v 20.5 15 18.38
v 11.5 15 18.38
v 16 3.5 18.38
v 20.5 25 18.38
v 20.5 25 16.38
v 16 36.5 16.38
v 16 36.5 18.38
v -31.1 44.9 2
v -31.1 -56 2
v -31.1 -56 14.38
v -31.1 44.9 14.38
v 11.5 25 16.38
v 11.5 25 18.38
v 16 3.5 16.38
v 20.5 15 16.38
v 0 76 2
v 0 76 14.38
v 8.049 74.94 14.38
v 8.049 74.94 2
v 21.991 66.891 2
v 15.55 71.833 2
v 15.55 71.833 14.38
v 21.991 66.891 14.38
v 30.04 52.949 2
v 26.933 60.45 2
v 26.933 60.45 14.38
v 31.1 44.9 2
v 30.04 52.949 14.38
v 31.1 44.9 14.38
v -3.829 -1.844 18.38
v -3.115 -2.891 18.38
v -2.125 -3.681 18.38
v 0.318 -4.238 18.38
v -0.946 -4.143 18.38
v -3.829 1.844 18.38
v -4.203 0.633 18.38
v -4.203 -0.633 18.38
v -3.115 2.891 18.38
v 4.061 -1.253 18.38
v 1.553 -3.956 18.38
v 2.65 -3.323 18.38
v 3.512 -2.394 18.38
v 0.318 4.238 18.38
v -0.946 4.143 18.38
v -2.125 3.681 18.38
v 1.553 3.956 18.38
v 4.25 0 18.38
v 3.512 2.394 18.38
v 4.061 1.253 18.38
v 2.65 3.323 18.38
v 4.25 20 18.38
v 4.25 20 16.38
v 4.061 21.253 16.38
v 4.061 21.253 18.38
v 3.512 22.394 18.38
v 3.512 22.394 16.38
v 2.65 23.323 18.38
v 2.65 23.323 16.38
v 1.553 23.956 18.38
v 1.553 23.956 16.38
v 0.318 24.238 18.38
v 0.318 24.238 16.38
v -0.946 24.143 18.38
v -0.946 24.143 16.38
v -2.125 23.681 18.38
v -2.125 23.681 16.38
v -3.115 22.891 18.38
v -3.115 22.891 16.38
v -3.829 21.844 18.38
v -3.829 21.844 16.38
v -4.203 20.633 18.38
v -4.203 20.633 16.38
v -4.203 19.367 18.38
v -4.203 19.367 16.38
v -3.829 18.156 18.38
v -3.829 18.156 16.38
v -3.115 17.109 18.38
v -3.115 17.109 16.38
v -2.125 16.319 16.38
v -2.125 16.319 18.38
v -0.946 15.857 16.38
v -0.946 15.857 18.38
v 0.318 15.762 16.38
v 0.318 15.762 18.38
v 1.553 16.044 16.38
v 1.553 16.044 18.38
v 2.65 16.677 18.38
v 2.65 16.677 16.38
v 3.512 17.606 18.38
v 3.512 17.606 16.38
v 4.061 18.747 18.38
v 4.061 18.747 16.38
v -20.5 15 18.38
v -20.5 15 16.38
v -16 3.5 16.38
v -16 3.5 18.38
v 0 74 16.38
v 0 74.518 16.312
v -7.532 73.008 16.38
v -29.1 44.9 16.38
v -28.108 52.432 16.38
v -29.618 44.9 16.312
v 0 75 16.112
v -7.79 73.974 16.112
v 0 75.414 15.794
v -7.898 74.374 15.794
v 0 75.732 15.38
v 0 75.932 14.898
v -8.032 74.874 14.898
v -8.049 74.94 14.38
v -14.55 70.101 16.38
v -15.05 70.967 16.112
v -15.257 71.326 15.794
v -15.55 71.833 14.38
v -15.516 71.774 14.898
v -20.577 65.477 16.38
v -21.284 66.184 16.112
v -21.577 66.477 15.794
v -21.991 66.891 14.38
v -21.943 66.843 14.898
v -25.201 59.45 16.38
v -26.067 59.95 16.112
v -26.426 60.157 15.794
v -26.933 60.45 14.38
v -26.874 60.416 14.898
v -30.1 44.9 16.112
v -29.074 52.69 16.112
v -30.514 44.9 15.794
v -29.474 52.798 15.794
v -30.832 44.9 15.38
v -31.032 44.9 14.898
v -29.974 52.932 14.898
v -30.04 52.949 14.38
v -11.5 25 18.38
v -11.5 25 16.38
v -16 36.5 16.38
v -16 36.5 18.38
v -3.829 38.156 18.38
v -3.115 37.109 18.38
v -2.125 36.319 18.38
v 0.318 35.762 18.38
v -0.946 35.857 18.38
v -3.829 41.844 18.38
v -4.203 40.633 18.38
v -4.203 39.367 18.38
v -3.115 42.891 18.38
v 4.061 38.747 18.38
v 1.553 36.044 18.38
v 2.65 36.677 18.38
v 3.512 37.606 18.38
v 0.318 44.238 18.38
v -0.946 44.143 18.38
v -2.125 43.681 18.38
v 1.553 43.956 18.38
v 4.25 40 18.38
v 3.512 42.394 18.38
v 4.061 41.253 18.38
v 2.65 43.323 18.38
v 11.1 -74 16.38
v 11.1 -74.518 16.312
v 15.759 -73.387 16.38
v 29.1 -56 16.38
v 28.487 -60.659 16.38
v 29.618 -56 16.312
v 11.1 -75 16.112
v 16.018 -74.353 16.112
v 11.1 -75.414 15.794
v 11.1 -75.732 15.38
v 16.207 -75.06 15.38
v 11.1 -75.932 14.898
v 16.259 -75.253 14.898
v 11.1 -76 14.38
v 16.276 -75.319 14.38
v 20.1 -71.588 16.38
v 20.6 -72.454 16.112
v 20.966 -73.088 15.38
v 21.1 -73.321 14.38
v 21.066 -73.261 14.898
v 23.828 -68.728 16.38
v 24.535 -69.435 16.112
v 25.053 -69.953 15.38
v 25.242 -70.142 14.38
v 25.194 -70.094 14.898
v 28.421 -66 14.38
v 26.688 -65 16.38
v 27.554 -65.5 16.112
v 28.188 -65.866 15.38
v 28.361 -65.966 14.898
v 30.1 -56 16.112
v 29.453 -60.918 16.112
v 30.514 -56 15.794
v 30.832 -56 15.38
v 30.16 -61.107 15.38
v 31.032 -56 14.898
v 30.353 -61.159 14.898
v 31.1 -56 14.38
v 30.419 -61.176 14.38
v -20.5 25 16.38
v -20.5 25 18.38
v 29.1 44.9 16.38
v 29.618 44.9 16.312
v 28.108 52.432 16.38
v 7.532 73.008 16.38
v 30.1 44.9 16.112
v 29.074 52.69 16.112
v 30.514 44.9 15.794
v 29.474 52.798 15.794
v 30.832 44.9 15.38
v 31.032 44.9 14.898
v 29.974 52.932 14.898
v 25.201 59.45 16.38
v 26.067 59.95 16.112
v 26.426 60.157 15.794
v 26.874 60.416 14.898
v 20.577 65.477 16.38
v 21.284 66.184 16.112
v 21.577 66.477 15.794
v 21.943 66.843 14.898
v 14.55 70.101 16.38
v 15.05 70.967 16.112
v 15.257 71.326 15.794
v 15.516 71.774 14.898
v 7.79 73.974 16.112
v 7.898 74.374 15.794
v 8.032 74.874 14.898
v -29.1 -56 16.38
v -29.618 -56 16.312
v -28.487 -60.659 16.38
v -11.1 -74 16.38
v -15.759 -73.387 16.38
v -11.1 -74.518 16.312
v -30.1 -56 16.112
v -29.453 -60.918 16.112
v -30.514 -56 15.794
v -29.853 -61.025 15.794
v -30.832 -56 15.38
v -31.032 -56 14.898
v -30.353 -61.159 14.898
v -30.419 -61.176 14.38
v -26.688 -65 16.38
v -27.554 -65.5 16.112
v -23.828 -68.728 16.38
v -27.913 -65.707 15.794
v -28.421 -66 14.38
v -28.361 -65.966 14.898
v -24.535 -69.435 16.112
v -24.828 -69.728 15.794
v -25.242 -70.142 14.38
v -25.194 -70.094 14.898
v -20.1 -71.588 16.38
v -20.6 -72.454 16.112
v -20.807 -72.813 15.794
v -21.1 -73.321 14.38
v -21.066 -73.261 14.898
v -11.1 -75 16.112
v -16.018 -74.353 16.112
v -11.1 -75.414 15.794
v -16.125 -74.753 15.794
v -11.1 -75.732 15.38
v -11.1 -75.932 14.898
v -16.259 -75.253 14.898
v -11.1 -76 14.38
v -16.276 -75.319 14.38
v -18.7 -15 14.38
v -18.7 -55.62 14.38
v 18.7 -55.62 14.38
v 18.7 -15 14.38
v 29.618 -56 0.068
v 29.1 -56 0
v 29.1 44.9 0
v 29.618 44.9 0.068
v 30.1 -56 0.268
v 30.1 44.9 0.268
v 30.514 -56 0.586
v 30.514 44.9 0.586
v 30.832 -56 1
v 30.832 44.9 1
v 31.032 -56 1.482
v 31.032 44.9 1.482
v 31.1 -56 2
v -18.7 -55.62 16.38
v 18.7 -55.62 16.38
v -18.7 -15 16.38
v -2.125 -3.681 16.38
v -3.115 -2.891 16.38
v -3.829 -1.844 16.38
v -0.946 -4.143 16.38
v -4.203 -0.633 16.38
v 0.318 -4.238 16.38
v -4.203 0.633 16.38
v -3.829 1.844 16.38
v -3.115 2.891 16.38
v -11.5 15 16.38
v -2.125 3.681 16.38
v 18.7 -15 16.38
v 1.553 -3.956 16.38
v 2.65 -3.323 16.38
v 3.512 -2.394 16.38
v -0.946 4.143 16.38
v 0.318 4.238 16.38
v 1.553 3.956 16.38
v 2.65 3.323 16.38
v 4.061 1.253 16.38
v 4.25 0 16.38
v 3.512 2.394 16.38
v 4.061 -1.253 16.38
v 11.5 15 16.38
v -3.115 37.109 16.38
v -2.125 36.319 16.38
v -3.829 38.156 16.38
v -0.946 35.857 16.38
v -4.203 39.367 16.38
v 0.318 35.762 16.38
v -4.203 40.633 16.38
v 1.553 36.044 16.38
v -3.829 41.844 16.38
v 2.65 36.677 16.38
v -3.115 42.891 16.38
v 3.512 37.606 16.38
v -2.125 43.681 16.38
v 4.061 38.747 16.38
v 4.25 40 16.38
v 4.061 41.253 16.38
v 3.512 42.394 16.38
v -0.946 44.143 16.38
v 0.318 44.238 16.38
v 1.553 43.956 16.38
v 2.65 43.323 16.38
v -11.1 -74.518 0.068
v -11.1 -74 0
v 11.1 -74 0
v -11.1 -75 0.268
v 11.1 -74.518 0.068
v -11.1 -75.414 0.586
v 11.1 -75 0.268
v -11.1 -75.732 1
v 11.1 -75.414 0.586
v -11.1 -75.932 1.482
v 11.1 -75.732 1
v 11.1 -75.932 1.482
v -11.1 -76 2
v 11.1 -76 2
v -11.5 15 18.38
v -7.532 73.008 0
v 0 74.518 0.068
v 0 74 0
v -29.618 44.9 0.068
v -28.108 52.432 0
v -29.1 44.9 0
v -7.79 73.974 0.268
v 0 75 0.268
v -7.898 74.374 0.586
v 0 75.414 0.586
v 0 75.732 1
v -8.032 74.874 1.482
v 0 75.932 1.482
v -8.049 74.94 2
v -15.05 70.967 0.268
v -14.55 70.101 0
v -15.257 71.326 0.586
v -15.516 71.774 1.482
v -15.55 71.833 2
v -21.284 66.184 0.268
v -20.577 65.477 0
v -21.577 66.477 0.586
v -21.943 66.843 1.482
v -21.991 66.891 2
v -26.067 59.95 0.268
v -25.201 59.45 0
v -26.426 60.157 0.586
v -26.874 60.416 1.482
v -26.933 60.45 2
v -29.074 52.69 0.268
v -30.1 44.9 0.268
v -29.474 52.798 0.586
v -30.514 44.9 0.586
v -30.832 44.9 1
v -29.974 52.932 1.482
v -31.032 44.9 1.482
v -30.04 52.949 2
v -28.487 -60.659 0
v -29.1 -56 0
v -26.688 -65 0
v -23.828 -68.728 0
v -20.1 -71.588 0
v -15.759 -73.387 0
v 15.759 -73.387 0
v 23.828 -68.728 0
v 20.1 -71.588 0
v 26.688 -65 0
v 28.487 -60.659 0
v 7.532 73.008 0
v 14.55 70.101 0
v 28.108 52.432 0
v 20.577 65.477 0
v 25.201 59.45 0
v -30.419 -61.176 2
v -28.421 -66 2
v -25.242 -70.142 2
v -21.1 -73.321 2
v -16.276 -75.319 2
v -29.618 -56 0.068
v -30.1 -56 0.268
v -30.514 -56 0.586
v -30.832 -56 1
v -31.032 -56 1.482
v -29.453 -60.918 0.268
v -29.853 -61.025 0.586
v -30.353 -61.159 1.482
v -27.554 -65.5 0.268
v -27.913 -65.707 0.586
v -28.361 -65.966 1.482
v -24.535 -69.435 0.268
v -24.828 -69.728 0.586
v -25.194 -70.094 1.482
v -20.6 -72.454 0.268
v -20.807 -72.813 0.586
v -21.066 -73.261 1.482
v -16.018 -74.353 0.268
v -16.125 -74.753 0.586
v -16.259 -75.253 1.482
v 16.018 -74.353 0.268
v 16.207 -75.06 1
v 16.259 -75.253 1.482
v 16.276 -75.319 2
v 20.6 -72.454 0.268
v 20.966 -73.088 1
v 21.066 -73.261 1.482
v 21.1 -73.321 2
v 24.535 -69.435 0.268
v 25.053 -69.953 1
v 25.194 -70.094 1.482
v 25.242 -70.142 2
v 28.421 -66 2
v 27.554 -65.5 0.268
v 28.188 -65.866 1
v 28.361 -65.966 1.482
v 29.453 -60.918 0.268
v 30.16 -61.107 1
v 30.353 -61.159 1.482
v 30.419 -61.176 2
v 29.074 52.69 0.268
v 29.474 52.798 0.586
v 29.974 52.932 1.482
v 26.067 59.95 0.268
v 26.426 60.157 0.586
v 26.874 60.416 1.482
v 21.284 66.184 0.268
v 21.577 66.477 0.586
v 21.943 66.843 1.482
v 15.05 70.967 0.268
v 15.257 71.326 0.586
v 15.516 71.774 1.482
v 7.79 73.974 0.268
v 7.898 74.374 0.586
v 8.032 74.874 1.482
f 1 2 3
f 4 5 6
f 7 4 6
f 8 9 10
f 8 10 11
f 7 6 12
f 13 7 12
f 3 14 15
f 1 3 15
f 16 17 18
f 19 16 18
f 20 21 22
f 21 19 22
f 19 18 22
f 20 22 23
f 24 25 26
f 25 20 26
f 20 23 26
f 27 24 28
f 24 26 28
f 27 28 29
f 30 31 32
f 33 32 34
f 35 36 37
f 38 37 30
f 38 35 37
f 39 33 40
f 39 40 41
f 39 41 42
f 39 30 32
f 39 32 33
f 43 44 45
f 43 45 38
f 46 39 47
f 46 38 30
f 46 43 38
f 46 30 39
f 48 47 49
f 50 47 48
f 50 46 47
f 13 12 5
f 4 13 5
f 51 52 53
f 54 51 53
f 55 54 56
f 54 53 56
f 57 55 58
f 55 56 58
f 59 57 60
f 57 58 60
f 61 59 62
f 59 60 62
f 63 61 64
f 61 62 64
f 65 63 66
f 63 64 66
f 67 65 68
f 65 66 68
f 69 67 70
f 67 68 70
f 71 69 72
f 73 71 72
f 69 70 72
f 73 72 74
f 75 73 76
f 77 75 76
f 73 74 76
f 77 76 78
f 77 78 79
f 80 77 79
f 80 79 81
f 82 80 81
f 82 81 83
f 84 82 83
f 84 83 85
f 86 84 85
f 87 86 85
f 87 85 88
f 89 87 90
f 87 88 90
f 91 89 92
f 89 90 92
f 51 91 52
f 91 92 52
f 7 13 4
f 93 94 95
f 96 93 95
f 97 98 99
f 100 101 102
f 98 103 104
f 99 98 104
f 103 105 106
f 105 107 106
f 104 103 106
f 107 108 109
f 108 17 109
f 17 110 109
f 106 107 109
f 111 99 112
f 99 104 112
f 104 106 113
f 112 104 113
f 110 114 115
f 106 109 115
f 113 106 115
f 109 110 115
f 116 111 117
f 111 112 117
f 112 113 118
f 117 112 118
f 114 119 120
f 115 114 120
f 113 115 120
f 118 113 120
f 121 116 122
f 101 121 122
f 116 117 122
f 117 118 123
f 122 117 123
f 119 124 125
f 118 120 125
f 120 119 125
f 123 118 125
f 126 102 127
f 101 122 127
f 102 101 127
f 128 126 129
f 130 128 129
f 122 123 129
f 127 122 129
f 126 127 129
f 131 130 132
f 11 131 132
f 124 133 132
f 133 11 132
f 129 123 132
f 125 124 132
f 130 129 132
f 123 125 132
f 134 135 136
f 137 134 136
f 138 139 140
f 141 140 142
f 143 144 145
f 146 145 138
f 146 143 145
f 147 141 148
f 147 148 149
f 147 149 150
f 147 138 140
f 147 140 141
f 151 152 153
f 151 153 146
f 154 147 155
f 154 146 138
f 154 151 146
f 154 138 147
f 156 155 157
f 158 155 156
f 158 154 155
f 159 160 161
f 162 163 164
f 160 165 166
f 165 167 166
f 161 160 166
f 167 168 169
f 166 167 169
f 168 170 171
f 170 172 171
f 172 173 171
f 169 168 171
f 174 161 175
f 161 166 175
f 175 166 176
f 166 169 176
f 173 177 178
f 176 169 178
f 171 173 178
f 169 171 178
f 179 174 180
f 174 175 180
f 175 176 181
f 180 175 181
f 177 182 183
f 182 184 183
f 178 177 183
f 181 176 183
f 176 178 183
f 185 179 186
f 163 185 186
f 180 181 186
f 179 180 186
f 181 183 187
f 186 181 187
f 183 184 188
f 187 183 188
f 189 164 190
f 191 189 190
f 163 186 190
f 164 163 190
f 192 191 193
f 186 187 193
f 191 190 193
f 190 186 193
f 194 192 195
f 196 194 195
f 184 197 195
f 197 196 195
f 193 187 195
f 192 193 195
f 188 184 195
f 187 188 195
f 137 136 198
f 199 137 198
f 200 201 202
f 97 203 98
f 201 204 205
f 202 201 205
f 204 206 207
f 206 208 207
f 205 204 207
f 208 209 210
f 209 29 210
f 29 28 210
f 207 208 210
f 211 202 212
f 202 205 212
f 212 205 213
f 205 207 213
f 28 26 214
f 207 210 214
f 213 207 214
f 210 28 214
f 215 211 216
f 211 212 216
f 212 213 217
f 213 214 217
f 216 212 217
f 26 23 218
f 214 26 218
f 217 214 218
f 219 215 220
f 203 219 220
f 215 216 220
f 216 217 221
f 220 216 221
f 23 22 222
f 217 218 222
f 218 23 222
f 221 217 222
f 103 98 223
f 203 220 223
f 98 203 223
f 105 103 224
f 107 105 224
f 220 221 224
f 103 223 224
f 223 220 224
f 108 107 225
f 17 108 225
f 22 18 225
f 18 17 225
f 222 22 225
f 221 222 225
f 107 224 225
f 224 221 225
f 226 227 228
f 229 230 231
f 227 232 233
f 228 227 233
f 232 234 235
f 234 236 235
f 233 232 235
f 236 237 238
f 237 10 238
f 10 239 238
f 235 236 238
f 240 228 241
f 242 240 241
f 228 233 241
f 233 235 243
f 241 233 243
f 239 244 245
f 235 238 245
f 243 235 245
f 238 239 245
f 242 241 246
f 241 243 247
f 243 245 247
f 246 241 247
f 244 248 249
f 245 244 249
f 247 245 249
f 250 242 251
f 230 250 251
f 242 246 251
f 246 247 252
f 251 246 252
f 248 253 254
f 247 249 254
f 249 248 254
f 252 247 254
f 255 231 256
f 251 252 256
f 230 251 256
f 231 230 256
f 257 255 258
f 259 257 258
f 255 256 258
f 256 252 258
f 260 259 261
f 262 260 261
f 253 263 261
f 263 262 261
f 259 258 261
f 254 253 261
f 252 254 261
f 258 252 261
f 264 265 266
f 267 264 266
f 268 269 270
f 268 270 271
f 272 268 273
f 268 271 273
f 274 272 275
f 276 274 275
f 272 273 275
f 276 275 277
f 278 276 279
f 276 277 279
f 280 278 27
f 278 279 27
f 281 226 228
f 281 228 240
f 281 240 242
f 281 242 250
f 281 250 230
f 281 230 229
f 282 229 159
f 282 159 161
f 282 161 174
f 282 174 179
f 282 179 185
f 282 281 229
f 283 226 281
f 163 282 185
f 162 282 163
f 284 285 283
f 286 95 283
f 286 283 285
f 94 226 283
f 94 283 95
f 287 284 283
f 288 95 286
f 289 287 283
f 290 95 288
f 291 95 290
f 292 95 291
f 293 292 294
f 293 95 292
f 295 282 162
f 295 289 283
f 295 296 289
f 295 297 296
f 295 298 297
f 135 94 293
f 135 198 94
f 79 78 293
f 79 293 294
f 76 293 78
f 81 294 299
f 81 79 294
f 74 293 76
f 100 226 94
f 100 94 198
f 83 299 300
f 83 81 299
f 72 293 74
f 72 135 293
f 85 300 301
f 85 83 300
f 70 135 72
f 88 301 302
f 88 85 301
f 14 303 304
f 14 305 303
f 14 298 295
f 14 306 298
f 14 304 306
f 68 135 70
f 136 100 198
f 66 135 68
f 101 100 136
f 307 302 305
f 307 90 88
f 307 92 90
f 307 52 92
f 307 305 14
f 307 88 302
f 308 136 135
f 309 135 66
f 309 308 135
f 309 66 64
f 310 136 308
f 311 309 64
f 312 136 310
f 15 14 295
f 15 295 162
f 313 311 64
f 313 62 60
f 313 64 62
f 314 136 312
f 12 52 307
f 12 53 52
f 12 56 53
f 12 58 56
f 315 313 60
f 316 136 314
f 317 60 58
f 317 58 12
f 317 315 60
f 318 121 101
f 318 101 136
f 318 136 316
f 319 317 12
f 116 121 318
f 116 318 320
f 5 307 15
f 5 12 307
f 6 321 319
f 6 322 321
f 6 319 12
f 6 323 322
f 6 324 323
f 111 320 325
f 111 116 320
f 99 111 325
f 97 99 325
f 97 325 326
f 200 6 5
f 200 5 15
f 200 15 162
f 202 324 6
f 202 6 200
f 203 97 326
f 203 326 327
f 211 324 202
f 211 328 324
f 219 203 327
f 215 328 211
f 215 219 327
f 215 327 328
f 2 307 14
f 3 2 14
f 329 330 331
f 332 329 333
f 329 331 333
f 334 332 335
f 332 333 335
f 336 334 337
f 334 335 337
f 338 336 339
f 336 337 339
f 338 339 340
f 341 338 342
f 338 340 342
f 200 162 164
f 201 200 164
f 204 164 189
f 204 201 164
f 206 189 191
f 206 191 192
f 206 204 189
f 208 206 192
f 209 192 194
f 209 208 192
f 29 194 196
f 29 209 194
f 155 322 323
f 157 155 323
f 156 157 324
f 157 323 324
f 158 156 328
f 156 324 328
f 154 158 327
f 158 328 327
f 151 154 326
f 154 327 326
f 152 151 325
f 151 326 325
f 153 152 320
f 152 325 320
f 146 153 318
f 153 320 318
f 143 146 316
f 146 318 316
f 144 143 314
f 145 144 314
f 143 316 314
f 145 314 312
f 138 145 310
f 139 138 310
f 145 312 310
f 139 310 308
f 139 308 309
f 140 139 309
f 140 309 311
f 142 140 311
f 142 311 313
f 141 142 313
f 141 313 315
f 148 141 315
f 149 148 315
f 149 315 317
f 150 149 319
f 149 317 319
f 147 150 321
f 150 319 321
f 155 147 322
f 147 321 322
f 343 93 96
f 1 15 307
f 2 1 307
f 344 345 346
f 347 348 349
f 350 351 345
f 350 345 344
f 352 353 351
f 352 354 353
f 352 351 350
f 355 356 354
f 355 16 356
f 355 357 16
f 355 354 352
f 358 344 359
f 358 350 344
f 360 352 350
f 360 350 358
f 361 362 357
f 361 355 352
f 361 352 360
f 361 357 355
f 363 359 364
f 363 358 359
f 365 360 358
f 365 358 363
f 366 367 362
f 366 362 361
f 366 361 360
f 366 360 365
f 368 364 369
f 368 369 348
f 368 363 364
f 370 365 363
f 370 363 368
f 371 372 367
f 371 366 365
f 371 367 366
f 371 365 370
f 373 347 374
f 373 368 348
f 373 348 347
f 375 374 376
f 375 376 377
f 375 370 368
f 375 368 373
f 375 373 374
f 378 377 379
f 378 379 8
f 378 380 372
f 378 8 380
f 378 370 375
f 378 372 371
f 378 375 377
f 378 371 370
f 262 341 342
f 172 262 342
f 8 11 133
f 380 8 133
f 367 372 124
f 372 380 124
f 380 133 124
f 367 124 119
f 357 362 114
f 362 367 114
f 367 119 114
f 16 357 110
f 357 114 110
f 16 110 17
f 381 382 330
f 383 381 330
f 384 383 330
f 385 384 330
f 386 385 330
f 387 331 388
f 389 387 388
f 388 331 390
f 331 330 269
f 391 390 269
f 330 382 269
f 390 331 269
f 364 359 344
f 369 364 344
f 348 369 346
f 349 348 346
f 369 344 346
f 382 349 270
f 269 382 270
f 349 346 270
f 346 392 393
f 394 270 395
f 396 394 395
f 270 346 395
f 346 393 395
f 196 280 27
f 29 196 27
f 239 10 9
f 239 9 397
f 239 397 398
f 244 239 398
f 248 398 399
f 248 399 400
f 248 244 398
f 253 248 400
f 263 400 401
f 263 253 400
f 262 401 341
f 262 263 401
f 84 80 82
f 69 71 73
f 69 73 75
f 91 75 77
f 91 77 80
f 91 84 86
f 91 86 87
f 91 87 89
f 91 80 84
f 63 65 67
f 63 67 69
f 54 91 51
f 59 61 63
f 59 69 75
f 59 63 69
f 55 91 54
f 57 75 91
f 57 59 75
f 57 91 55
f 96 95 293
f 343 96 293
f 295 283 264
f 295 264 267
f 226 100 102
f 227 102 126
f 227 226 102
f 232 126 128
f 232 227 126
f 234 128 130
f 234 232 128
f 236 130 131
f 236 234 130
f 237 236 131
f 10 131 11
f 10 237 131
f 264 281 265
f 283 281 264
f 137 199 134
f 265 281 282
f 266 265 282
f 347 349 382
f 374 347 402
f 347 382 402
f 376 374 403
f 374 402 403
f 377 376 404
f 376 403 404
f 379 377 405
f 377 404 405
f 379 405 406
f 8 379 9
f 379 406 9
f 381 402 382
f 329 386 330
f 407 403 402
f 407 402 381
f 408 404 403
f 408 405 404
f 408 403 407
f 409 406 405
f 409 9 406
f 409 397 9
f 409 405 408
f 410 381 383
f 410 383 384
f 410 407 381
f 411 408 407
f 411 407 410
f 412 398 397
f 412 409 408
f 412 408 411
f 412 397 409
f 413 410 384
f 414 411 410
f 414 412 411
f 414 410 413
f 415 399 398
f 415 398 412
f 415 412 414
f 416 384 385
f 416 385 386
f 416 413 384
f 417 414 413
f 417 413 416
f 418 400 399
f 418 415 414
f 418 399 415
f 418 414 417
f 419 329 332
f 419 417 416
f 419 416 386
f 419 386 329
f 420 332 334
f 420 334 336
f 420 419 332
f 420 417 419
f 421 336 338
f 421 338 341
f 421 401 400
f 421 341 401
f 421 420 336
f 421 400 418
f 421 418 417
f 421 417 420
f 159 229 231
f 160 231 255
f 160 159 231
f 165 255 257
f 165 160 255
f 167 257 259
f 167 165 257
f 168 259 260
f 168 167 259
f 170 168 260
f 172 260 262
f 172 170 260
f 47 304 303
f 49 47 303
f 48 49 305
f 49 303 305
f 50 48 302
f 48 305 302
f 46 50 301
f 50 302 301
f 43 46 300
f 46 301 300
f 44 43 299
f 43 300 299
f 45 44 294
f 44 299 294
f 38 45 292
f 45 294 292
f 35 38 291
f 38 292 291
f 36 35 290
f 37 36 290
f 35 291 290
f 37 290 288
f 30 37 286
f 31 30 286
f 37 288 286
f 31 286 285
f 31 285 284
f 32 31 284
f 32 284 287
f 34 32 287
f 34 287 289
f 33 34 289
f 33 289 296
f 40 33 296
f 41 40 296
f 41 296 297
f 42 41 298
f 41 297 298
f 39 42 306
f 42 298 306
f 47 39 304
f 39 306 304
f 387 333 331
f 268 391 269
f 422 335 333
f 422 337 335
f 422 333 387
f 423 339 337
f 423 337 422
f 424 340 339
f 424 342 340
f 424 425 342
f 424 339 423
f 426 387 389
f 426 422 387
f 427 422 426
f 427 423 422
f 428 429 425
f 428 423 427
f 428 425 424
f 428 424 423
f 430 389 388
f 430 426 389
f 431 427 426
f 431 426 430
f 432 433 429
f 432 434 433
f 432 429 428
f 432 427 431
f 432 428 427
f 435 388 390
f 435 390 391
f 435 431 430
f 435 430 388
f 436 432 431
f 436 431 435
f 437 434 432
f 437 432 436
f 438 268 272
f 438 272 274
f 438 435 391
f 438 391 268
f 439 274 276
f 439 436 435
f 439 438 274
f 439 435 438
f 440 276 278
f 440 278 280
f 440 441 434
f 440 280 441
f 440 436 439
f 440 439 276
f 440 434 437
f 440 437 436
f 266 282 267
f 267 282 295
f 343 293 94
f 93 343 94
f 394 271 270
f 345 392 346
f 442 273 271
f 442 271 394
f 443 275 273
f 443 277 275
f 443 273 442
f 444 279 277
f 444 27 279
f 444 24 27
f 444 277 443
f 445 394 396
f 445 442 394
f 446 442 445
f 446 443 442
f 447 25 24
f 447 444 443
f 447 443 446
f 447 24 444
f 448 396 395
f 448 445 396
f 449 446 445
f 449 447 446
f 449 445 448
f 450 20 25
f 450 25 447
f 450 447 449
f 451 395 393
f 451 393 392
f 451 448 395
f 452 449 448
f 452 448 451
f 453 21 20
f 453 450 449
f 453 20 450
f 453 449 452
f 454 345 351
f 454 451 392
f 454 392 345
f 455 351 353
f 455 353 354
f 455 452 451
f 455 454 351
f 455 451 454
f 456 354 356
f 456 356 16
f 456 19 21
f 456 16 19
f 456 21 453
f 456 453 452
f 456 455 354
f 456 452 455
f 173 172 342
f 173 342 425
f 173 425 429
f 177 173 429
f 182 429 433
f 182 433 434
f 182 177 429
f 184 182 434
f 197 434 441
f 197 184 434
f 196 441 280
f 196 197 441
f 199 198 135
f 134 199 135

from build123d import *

# Parameters (mm, degrees)
F0_W     = 62.2
F0_H     = 152
F1_DEPTH = 16.38
F2_R     = 20
F3_R     = 31.09999
F4_R     = 2
F5_W     = 37.4
F5_H     = 40.62
F6_DEPTH = 2
F7_R     = 4.25
F8_DEPTH = 2


# Not quite as in the source:
# - a fillet or chamfer is up to 0.001 mm smaller than in the source, because OpenCascade refuses the exact size


with BuildPart() as f1:
    # F0 (on Top) → F1 (new body)
    with BuildSketch(Plane.XY):
        Rectangle(F0_W, F0_H)
    extrude(amount=F1_DEPTH)

    # F2
    f2_edges = [f1.edges().sort_by_distance(p)[0] for p in [
        (-31.1, -76, 8.19),
        (31.1, -76, 8.19),
    ]]
    fillet(f2_edges, radius=F2_R)

    # F3 (radius 31.1 in the source; OpenCascade refuses exactly that, so slightly less here)
    f3_edges = [f1.edges().sort_by_distance(p)[0] for p in [
        (31.1, 76, 8.19),
        (-31.1, 76, 8.19),
    ]]
    fillet(f3_edges, radius=F3_R)

    # F4
    f4_edges = [f1.edges().sort_by_distance(p)[0] for p in [
        (31.1, -5.549995, 16.38),
        (31.1, -5.549995, 0),
    ]]
    fillet(f4_edges, radius=F4_R)

    # F5 (on face) → F6 (cut)
    with BuildSketch(Plane.XY.offset(16.38)):
        with Locations((0, -35.31)):
            Rectangle(F5_W, F5_H)
    extrude(amount=-F6_DEPTH, mode=Mode.SUBTRACT)

    # F7 (on face) → F8 (join)
    with BuildSketch(Plane.XY.offset(16.38)):
        Polygon((11.5, 15), (16, 3.5), (20.5, 15), align=None)
        Circle(F7_R)
        Polygon((-16, 3.5), (-11.5, 15), (-20.5, 15), align=None)
        Polygon((-20.5, 25), (-11.5, 25), (-16, 36.5), align=None)
        with Locations((0, 20)):
            Circle(F7_R)
        Polygon((11.5, 25), (20.5, 25), (16, 36.5), align=None)
        with Locations((0, 40)):
            Circle(F7_R)
    extrude(amount=F8_DEPTH)


solid = f1.part
